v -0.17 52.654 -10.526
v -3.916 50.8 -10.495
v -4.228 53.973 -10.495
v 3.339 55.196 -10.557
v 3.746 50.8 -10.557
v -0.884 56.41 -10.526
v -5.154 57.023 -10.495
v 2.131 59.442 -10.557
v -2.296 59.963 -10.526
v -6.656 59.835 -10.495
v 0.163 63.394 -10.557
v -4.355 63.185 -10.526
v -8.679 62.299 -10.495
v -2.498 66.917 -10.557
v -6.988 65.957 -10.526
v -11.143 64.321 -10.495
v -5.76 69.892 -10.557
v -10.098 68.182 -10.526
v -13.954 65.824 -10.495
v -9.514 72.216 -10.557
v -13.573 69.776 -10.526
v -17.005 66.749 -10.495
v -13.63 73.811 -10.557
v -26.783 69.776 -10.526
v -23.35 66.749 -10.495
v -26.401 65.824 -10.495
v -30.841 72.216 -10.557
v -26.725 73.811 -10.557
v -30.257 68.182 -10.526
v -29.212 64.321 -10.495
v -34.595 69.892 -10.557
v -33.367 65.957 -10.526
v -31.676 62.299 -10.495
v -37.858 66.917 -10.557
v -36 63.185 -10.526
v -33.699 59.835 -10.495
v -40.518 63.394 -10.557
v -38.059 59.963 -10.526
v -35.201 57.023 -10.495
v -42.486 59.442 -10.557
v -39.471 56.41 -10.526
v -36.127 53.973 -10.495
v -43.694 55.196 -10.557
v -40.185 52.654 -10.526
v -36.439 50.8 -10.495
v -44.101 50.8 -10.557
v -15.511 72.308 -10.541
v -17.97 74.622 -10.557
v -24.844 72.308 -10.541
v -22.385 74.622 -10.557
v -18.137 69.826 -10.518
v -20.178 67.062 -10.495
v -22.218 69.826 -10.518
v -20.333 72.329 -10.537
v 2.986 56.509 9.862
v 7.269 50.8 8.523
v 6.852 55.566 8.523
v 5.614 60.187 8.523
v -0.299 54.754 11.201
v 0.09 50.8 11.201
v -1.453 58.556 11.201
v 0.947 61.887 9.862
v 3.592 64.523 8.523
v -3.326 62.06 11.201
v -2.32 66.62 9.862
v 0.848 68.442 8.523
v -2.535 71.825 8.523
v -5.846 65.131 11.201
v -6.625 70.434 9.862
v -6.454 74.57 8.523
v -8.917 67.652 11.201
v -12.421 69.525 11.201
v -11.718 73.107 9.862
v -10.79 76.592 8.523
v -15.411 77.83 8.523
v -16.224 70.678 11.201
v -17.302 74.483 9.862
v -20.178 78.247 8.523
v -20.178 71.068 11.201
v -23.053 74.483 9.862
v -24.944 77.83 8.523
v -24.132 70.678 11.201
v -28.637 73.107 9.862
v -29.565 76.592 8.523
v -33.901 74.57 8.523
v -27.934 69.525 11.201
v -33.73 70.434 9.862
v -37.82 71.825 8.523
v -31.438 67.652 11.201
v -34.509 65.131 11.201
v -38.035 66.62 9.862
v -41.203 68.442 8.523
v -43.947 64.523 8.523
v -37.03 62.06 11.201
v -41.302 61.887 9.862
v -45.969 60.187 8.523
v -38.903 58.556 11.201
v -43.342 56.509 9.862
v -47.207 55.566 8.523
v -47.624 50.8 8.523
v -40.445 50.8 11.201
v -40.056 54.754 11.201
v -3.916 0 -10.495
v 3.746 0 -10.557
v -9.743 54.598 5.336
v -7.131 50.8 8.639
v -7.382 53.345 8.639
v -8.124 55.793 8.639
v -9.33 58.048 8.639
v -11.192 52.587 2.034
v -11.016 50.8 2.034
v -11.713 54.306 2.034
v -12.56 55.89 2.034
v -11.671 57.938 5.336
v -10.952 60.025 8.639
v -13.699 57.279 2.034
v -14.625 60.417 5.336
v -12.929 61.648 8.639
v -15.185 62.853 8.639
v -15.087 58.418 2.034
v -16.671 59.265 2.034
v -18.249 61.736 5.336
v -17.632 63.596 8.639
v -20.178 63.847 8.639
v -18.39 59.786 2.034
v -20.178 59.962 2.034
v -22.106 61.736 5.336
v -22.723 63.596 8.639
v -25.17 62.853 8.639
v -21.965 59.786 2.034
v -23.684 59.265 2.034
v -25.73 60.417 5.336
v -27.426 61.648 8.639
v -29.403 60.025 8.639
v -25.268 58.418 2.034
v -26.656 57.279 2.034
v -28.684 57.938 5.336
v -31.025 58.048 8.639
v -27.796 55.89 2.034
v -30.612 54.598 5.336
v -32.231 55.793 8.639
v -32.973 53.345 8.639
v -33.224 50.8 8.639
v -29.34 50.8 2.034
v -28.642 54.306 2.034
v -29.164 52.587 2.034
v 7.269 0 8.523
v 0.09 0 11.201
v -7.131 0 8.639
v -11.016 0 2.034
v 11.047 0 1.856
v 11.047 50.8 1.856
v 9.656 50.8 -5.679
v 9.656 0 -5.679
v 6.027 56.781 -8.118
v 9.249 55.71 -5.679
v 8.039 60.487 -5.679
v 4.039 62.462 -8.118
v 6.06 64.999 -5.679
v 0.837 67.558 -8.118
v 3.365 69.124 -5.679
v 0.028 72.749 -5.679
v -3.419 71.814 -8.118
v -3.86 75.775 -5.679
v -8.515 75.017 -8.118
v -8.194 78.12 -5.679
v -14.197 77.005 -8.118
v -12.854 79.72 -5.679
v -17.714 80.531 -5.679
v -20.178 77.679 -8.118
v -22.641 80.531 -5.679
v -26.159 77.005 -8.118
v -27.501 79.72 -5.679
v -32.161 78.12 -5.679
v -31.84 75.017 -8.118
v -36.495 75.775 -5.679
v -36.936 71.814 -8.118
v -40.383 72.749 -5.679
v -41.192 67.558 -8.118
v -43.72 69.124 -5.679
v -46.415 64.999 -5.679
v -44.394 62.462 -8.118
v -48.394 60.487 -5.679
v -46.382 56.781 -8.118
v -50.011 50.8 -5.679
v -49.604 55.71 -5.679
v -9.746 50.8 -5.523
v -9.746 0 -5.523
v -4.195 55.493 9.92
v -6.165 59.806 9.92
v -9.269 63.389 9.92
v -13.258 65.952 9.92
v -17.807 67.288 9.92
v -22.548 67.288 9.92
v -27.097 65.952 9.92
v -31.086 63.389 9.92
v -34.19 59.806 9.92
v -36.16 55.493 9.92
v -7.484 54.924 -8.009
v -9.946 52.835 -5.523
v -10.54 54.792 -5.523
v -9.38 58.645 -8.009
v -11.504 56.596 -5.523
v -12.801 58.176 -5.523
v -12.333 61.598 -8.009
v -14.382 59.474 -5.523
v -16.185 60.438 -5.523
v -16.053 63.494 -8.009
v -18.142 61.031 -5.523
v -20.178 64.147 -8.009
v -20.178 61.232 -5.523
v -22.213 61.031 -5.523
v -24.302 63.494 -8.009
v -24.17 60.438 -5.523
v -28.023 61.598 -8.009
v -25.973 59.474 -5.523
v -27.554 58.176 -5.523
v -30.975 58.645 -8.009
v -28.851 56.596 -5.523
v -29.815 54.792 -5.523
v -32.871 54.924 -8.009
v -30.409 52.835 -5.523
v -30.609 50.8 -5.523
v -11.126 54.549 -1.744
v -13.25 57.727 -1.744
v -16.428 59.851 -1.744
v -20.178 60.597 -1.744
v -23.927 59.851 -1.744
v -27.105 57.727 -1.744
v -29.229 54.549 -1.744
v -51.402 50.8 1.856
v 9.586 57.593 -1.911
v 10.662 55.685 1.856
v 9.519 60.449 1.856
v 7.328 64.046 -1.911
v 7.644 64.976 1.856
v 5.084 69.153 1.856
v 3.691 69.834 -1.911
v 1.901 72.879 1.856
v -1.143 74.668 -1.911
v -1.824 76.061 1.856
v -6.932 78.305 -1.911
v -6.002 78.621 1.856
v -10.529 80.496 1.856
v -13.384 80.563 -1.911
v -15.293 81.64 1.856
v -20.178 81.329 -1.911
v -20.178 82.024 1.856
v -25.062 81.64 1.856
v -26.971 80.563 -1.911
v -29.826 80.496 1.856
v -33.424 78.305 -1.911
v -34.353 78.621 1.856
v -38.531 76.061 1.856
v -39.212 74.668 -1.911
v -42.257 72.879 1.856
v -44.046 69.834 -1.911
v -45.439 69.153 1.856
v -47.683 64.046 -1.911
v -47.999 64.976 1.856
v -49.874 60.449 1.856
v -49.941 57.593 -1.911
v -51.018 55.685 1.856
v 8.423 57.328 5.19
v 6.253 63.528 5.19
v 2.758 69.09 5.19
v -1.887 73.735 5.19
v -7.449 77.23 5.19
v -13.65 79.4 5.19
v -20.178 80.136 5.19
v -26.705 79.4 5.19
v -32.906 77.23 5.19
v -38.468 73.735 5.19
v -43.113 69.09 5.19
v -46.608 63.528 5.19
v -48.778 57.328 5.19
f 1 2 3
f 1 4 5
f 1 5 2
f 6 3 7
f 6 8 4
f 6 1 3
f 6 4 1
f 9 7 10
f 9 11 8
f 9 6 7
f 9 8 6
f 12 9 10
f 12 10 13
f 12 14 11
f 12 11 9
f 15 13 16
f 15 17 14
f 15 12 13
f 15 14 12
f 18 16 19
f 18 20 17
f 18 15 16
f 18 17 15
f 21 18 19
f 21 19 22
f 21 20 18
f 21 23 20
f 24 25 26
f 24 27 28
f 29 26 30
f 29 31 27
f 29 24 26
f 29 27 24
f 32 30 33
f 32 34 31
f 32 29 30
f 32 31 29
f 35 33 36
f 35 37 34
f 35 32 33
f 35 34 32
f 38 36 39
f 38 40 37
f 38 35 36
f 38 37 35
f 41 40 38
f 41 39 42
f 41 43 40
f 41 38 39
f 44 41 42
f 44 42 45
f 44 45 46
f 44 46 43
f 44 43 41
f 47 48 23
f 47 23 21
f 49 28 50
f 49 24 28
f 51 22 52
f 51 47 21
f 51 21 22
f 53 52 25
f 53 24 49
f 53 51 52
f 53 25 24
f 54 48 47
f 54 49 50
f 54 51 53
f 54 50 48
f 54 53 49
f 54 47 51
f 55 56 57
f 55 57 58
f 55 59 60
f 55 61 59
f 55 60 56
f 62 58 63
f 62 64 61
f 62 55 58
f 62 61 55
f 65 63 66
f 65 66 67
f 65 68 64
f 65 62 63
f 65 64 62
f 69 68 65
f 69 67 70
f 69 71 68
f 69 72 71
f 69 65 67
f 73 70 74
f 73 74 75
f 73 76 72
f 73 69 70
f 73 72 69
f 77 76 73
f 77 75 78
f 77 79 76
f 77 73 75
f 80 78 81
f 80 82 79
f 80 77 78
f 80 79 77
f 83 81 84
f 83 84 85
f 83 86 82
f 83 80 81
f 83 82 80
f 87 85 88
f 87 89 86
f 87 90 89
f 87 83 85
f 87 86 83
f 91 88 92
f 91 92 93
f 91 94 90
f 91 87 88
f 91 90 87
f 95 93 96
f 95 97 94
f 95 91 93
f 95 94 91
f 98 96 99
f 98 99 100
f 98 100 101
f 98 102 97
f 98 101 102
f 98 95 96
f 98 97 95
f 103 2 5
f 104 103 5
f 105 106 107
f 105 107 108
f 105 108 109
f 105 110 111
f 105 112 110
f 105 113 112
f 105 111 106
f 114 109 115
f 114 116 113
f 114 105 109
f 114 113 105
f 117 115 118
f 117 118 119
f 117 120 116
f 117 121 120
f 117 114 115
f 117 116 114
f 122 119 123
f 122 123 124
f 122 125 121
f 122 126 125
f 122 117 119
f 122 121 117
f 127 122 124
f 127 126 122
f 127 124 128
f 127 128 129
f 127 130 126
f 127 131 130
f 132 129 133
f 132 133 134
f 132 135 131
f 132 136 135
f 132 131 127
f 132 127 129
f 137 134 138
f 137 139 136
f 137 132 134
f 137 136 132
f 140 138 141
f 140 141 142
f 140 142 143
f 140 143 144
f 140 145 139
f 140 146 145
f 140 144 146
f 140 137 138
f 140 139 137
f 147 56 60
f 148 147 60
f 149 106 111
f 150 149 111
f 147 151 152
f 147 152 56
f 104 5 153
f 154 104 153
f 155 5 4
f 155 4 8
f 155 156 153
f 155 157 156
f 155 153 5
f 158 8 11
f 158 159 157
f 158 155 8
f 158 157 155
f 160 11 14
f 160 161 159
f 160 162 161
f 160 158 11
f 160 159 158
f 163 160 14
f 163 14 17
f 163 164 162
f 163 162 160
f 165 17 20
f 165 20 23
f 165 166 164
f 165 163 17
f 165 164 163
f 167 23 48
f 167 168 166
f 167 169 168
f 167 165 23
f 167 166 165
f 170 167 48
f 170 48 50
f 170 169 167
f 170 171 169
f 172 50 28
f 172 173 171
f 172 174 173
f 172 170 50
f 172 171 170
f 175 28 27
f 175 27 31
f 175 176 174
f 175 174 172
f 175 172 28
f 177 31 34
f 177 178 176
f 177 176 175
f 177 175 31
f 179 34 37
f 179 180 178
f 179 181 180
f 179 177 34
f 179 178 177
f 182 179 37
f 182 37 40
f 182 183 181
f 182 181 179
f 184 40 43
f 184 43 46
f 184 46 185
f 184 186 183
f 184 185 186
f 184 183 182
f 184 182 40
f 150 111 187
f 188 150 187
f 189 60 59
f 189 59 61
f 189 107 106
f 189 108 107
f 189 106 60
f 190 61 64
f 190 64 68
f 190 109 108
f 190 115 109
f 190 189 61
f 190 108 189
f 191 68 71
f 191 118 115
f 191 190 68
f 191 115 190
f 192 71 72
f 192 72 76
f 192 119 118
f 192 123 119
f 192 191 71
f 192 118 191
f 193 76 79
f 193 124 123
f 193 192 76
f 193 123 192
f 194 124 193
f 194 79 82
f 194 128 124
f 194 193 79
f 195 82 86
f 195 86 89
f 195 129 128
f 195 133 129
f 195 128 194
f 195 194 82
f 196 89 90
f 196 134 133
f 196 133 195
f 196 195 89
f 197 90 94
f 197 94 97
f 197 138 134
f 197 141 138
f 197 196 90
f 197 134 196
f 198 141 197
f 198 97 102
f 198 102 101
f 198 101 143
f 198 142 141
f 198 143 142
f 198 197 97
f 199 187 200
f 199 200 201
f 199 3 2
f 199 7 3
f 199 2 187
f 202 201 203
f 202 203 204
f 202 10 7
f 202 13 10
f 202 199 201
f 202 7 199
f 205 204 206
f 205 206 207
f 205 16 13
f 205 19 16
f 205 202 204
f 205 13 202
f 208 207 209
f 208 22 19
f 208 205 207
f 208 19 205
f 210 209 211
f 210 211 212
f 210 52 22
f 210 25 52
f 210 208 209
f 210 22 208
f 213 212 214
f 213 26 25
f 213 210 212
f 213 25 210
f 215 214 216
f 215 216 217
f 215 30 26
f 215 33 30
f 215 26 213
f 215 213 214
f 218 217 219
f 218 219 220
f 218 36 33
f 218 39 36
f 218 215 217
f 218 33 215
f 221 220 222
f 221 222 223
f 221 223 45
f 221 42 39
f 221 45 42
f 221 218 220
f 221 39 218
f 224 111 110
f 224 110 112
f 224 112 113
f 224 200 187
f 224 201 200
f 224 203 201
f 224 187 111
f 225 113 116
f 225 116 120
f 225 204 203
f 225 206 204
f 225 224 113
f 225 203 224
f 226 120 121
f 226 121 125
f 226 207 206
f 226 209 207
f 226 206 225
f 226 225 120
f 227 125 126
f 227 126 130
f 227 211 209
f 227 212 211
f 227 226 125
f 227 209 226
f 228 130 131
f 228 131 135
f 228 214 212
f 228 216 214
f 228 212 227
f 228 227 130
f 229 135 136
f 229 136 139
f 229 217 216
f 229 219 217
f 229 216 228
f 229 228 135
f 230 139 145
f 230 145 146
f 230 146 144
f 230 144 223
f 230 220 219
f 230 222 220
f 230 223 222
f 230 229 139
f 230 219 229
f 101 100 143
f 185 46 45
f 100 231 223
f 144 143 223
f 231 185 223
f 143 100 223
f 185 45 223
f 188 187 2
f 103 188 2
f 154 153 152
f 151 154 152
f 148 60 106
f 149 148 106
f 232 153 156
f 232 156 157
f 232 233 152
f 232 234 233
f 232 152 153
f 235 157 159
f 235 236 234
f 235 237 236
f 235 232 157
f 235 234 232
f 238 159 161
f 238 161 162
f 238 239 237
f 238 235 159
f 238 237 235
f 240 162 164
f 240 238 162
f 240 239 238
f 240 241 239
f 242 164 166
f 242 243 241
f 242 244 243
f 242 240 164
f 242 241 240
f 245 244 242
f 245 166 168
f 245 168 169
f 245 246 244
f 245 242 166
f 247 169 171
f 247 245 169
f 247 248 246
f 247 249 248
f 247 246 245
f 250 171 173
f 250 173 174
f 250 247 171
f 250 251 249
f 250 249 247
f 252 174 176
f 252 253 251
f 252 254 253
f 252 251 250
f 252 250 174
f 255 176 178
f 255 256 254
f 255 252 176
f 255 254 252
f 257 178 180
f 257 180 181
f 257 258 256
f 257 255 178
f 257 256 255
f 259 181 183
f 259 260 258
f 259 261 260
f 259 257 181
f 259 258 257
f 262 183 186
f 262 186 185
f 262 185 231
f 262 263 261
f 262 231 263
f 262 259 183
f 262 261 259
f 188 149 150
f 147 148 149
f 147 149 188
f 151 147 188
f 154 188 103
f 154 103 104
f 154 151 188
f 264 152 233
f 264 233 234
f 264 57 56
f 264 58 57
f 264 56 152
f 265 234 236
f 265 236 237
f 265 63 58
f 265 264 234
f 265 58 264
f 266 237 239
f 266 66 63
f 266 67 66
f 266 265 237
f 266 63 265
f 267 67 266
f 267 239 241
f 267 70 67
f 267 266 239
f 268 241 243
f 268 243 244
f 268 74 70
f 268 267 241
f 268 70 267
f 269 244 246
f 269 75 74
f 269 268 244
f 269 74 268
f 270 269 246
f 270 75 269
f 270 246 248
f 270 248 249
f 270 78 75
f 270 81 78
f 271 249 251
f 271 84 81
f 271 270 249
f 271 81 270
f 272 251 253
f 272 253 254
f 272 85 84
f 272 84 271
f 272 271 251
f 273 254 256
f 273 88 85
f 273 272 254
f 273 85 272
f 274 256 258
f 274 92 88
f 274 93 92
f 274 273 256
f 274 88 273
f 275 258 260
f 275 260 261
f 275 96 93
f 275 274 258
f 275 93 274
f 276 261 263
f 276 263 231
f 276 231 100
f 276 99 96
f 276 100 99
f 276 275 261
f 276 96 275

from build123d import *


with BuildPart() as f2:
    # F2: sweep along a path in F1
    with BuildLine(Plane.XY) as f2_path:
        Line((0, 0), (0, 50.8))
        ThreePointArc((0, 50.8), (-20.17757, 70.97757), (-40.35514, 50.8))
    # F0 (on Front) → F2 (sweep)
    with BuildSketch(Plane.XZ):
        Polygon((11.046861, 1.856294), (7.269184, 8.522789), (0.090175, 11.201377), (-7.131028, 8.638716), (-11.015544, 2.033904), (-9.745764, -5.522594), (-3.915833, -10.495009), (3.74636, -10.556693), (9.655589, -5.678782), align=None)
    sweep(path=f2_path.line)


solid = f2.part
